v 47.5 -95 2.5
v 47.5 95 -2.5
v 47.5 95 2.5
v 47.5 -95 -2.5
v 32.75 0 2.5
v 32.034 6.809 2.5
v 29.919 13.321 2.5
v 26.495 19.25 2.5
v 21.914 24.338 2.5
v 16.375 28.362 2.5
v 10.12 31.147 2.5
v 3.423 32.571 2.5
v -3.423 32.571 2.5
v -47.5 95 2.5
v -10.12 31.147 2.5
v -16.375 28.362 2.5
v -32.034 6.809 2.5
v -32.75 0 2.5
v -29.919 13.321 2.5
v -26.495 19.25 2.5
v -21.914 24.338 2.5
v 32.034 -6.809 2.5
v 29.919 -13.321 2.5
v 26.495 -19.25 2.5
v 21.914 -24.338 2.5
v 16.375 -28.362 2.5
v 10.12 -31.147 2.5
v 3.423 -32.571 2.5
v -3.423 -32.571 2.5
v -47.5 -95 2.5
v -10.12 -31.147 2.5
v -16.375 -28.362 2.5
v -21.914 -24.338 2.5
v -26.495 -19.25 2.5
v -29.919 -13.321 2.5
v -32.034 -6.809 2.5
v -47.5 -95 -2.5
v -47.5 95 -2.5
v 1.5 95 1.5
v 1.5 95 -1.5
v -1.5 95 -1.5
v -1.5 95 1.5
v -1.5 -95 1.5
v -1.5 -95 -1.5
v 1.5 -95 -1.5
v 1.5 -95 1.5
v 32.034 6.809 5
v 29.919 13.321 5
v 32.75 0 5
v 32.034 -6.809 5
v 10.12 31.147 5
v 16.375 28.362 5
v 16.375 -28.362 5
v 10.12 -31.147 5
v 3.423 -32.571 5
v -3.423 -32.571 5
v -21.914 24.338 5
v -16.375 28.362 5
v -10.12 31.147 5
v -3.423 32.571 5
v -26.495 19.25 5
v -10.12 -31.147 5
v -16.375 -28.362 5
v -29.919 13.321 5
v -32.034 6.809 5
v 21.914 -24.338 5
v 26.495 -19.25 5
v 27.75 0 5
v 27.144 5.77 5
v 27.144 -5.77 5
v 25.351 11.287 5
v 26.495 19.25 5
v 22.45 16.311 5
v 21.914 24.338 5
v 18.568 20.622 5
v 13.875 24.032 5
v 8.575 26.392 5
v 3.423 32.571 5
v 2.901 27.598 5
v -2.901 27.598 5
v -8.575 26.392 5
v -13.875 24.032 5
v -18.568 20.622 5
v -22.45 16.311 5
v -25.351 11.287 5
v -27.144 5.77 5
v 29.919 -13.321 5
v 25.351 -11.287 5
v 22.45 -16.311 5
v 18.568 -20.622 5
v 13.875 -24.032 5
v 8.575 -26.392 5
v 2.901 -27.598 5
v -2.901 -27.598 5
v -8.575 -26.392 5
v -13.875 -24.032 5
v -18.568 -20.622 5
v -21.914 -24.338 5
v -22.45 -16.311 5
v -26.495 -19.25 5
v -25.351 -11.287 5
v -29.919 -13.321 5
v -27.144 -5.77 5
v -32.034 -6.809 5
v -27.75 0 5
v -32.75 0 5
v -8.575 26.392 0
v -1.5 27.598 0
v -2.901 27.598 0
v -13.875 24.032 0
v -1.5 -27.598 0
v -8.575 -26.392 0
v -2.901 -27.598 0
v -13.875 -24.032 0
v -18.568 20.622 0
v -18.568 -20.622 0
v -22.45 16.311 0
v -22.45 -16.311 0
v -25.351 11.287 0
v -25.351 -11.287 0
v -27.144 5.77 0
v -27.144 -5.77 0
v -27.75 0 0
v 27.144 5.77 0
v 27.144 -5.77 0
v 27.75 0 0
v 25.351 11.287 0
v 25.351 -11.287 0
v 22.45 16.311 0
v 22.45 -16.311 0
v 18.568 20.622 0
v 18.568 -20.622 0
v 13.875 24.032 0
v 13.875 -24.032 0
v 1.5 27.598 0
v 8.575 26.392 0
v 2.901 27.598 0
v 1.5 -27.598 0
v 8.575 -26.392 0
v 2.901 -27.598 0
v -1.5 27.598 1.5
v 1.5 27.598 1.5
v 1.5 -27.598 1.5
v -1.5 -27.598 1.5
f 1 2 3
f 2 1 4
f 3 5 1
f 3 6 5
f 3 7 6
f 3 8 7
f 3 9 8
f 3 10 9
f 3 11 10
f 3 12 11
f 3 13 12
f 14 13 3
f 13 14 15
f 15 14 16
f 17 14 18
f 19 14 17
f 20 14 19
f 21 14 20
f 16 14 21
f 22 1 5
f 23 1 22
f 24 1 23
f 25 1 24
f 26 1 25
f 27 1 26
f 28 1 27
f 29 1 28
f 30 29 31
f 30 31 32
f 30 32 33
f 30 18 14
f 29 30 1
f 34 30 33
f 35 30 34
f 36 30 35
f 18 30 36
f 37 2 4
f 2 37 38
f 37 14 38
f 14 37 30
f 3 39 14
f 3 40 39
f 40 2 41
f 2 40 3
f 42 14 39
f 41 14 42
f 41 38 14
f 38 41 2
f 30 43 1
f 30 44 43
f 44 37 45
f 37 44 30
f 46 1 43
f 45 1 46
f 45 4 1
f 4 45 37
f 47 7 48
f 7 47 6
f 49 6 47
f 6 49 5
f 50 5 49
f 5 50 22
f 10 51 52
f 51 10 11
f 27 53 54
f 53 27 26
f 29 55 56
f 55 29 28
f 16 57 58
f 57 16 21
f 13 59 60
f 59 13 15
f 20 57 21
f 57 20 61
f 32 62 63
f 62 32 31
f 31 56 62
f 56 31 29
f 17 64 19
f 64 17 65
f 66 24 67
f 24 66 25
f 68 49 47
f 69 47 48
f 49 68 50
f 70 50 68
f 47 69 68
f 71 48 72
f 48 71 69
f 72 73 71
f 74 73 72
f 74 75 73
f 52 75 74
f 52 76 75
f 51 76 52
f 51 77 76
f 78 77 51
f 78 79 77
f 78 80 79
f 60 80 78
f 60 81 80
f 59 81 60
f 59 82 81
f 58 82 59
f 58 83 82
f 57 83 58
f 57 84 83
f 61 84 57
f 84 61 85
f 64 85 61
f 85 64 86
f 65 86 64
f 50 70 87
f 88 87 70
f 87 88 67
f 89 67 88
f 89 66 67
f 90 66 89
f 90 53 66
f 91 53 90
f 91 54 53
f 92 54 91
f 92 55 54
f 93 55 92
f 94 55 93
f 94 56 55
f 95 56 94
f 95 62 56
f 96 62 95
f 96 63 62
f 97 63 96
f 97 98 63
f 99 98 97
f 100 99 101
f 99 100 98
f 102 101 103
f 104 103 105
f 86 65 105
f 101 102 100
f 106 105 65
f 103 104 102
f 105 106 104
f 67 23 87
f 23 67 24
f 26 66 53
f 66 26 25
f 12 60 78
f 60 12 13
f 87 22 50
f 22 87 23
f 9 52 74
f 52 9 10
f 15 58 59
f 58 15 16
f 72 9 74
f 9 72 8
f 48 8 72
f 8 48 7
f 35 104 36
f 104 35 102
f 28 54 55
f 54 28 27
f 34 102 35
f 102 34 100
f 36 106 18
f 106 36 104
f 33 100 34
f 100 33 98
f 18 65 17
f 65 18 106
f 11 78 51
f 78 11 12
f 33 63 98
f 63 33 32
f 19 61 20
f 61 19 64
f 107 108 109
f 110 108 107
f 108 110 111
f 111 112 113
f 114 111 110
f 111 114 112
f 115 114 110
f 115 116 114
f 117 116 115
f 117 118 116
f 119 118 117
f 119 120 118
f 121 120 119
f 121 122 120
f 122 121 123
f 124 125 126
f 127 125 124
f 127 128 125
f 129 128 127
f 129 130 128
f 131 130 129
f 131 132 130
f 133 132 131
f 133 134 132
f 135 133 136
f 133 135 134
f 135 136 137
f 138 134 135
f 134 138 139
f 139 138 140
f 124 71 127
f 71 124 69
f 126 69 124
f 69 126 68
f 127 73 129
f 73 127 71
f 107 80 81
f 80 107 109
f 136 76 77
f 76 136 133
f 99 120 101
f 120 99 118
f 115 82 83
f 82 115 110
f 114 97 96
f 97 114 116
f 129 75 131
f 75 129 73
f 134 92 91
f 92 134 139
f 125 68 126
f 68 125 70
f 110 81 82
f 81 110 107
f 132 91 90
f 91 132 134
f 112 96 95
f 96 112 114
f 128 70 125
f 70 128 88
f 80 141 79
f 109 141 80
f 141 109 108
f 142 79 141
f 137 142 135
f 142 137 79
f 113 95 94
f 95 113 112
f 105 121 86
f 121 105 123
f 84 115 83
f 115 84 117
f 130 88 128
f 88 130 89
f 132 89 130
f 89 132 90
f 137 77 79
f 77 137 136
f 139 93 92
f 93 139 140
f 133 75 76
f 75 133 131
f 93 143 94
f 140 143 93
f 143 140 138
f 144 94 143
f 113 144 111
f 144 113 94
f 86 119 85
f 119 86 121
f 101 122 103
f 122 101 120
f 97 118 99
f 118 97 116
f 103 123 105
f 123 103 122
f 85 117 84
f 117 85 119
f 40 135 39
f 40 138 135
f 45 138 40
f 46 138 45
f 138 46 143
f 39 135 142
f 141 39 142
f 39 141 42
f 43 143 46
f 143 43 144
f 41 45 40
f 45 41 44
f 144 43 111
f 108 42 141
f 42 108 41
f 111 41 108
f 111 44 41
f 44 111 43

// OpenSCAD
d_puck = 55.5;
t_puck = 5;

d_cable = 3;
d_cable_thick = 5;
l_cable_thick = 10; // reinforced no bend section


l_base = 190;
w_base = 95;
t_base = d_cable + 2; // 11.5 mm max depth


difference() {
    union() {
        // Rectangular base
        cube([w_base, l_base, t_base], center = true);
        
        // Thick section surrounding
        cylinder(h = t_puck, d = d_puck + l_cable_thick);
    }
    
    // Charger puck cut out
    cylinder(h = t_puck, d = d_puck);
    
    // Cable slot (thin section)
    cube([d_cable, l_base, d_cable], center = true);
    
    // Cable slot (strain relief section)
    translate([w_base/2, l_base/2 + d_puck/2, 0])
        cube([d_cable_thick, l_cable_thick, d_cable_thick], center = true);
}
